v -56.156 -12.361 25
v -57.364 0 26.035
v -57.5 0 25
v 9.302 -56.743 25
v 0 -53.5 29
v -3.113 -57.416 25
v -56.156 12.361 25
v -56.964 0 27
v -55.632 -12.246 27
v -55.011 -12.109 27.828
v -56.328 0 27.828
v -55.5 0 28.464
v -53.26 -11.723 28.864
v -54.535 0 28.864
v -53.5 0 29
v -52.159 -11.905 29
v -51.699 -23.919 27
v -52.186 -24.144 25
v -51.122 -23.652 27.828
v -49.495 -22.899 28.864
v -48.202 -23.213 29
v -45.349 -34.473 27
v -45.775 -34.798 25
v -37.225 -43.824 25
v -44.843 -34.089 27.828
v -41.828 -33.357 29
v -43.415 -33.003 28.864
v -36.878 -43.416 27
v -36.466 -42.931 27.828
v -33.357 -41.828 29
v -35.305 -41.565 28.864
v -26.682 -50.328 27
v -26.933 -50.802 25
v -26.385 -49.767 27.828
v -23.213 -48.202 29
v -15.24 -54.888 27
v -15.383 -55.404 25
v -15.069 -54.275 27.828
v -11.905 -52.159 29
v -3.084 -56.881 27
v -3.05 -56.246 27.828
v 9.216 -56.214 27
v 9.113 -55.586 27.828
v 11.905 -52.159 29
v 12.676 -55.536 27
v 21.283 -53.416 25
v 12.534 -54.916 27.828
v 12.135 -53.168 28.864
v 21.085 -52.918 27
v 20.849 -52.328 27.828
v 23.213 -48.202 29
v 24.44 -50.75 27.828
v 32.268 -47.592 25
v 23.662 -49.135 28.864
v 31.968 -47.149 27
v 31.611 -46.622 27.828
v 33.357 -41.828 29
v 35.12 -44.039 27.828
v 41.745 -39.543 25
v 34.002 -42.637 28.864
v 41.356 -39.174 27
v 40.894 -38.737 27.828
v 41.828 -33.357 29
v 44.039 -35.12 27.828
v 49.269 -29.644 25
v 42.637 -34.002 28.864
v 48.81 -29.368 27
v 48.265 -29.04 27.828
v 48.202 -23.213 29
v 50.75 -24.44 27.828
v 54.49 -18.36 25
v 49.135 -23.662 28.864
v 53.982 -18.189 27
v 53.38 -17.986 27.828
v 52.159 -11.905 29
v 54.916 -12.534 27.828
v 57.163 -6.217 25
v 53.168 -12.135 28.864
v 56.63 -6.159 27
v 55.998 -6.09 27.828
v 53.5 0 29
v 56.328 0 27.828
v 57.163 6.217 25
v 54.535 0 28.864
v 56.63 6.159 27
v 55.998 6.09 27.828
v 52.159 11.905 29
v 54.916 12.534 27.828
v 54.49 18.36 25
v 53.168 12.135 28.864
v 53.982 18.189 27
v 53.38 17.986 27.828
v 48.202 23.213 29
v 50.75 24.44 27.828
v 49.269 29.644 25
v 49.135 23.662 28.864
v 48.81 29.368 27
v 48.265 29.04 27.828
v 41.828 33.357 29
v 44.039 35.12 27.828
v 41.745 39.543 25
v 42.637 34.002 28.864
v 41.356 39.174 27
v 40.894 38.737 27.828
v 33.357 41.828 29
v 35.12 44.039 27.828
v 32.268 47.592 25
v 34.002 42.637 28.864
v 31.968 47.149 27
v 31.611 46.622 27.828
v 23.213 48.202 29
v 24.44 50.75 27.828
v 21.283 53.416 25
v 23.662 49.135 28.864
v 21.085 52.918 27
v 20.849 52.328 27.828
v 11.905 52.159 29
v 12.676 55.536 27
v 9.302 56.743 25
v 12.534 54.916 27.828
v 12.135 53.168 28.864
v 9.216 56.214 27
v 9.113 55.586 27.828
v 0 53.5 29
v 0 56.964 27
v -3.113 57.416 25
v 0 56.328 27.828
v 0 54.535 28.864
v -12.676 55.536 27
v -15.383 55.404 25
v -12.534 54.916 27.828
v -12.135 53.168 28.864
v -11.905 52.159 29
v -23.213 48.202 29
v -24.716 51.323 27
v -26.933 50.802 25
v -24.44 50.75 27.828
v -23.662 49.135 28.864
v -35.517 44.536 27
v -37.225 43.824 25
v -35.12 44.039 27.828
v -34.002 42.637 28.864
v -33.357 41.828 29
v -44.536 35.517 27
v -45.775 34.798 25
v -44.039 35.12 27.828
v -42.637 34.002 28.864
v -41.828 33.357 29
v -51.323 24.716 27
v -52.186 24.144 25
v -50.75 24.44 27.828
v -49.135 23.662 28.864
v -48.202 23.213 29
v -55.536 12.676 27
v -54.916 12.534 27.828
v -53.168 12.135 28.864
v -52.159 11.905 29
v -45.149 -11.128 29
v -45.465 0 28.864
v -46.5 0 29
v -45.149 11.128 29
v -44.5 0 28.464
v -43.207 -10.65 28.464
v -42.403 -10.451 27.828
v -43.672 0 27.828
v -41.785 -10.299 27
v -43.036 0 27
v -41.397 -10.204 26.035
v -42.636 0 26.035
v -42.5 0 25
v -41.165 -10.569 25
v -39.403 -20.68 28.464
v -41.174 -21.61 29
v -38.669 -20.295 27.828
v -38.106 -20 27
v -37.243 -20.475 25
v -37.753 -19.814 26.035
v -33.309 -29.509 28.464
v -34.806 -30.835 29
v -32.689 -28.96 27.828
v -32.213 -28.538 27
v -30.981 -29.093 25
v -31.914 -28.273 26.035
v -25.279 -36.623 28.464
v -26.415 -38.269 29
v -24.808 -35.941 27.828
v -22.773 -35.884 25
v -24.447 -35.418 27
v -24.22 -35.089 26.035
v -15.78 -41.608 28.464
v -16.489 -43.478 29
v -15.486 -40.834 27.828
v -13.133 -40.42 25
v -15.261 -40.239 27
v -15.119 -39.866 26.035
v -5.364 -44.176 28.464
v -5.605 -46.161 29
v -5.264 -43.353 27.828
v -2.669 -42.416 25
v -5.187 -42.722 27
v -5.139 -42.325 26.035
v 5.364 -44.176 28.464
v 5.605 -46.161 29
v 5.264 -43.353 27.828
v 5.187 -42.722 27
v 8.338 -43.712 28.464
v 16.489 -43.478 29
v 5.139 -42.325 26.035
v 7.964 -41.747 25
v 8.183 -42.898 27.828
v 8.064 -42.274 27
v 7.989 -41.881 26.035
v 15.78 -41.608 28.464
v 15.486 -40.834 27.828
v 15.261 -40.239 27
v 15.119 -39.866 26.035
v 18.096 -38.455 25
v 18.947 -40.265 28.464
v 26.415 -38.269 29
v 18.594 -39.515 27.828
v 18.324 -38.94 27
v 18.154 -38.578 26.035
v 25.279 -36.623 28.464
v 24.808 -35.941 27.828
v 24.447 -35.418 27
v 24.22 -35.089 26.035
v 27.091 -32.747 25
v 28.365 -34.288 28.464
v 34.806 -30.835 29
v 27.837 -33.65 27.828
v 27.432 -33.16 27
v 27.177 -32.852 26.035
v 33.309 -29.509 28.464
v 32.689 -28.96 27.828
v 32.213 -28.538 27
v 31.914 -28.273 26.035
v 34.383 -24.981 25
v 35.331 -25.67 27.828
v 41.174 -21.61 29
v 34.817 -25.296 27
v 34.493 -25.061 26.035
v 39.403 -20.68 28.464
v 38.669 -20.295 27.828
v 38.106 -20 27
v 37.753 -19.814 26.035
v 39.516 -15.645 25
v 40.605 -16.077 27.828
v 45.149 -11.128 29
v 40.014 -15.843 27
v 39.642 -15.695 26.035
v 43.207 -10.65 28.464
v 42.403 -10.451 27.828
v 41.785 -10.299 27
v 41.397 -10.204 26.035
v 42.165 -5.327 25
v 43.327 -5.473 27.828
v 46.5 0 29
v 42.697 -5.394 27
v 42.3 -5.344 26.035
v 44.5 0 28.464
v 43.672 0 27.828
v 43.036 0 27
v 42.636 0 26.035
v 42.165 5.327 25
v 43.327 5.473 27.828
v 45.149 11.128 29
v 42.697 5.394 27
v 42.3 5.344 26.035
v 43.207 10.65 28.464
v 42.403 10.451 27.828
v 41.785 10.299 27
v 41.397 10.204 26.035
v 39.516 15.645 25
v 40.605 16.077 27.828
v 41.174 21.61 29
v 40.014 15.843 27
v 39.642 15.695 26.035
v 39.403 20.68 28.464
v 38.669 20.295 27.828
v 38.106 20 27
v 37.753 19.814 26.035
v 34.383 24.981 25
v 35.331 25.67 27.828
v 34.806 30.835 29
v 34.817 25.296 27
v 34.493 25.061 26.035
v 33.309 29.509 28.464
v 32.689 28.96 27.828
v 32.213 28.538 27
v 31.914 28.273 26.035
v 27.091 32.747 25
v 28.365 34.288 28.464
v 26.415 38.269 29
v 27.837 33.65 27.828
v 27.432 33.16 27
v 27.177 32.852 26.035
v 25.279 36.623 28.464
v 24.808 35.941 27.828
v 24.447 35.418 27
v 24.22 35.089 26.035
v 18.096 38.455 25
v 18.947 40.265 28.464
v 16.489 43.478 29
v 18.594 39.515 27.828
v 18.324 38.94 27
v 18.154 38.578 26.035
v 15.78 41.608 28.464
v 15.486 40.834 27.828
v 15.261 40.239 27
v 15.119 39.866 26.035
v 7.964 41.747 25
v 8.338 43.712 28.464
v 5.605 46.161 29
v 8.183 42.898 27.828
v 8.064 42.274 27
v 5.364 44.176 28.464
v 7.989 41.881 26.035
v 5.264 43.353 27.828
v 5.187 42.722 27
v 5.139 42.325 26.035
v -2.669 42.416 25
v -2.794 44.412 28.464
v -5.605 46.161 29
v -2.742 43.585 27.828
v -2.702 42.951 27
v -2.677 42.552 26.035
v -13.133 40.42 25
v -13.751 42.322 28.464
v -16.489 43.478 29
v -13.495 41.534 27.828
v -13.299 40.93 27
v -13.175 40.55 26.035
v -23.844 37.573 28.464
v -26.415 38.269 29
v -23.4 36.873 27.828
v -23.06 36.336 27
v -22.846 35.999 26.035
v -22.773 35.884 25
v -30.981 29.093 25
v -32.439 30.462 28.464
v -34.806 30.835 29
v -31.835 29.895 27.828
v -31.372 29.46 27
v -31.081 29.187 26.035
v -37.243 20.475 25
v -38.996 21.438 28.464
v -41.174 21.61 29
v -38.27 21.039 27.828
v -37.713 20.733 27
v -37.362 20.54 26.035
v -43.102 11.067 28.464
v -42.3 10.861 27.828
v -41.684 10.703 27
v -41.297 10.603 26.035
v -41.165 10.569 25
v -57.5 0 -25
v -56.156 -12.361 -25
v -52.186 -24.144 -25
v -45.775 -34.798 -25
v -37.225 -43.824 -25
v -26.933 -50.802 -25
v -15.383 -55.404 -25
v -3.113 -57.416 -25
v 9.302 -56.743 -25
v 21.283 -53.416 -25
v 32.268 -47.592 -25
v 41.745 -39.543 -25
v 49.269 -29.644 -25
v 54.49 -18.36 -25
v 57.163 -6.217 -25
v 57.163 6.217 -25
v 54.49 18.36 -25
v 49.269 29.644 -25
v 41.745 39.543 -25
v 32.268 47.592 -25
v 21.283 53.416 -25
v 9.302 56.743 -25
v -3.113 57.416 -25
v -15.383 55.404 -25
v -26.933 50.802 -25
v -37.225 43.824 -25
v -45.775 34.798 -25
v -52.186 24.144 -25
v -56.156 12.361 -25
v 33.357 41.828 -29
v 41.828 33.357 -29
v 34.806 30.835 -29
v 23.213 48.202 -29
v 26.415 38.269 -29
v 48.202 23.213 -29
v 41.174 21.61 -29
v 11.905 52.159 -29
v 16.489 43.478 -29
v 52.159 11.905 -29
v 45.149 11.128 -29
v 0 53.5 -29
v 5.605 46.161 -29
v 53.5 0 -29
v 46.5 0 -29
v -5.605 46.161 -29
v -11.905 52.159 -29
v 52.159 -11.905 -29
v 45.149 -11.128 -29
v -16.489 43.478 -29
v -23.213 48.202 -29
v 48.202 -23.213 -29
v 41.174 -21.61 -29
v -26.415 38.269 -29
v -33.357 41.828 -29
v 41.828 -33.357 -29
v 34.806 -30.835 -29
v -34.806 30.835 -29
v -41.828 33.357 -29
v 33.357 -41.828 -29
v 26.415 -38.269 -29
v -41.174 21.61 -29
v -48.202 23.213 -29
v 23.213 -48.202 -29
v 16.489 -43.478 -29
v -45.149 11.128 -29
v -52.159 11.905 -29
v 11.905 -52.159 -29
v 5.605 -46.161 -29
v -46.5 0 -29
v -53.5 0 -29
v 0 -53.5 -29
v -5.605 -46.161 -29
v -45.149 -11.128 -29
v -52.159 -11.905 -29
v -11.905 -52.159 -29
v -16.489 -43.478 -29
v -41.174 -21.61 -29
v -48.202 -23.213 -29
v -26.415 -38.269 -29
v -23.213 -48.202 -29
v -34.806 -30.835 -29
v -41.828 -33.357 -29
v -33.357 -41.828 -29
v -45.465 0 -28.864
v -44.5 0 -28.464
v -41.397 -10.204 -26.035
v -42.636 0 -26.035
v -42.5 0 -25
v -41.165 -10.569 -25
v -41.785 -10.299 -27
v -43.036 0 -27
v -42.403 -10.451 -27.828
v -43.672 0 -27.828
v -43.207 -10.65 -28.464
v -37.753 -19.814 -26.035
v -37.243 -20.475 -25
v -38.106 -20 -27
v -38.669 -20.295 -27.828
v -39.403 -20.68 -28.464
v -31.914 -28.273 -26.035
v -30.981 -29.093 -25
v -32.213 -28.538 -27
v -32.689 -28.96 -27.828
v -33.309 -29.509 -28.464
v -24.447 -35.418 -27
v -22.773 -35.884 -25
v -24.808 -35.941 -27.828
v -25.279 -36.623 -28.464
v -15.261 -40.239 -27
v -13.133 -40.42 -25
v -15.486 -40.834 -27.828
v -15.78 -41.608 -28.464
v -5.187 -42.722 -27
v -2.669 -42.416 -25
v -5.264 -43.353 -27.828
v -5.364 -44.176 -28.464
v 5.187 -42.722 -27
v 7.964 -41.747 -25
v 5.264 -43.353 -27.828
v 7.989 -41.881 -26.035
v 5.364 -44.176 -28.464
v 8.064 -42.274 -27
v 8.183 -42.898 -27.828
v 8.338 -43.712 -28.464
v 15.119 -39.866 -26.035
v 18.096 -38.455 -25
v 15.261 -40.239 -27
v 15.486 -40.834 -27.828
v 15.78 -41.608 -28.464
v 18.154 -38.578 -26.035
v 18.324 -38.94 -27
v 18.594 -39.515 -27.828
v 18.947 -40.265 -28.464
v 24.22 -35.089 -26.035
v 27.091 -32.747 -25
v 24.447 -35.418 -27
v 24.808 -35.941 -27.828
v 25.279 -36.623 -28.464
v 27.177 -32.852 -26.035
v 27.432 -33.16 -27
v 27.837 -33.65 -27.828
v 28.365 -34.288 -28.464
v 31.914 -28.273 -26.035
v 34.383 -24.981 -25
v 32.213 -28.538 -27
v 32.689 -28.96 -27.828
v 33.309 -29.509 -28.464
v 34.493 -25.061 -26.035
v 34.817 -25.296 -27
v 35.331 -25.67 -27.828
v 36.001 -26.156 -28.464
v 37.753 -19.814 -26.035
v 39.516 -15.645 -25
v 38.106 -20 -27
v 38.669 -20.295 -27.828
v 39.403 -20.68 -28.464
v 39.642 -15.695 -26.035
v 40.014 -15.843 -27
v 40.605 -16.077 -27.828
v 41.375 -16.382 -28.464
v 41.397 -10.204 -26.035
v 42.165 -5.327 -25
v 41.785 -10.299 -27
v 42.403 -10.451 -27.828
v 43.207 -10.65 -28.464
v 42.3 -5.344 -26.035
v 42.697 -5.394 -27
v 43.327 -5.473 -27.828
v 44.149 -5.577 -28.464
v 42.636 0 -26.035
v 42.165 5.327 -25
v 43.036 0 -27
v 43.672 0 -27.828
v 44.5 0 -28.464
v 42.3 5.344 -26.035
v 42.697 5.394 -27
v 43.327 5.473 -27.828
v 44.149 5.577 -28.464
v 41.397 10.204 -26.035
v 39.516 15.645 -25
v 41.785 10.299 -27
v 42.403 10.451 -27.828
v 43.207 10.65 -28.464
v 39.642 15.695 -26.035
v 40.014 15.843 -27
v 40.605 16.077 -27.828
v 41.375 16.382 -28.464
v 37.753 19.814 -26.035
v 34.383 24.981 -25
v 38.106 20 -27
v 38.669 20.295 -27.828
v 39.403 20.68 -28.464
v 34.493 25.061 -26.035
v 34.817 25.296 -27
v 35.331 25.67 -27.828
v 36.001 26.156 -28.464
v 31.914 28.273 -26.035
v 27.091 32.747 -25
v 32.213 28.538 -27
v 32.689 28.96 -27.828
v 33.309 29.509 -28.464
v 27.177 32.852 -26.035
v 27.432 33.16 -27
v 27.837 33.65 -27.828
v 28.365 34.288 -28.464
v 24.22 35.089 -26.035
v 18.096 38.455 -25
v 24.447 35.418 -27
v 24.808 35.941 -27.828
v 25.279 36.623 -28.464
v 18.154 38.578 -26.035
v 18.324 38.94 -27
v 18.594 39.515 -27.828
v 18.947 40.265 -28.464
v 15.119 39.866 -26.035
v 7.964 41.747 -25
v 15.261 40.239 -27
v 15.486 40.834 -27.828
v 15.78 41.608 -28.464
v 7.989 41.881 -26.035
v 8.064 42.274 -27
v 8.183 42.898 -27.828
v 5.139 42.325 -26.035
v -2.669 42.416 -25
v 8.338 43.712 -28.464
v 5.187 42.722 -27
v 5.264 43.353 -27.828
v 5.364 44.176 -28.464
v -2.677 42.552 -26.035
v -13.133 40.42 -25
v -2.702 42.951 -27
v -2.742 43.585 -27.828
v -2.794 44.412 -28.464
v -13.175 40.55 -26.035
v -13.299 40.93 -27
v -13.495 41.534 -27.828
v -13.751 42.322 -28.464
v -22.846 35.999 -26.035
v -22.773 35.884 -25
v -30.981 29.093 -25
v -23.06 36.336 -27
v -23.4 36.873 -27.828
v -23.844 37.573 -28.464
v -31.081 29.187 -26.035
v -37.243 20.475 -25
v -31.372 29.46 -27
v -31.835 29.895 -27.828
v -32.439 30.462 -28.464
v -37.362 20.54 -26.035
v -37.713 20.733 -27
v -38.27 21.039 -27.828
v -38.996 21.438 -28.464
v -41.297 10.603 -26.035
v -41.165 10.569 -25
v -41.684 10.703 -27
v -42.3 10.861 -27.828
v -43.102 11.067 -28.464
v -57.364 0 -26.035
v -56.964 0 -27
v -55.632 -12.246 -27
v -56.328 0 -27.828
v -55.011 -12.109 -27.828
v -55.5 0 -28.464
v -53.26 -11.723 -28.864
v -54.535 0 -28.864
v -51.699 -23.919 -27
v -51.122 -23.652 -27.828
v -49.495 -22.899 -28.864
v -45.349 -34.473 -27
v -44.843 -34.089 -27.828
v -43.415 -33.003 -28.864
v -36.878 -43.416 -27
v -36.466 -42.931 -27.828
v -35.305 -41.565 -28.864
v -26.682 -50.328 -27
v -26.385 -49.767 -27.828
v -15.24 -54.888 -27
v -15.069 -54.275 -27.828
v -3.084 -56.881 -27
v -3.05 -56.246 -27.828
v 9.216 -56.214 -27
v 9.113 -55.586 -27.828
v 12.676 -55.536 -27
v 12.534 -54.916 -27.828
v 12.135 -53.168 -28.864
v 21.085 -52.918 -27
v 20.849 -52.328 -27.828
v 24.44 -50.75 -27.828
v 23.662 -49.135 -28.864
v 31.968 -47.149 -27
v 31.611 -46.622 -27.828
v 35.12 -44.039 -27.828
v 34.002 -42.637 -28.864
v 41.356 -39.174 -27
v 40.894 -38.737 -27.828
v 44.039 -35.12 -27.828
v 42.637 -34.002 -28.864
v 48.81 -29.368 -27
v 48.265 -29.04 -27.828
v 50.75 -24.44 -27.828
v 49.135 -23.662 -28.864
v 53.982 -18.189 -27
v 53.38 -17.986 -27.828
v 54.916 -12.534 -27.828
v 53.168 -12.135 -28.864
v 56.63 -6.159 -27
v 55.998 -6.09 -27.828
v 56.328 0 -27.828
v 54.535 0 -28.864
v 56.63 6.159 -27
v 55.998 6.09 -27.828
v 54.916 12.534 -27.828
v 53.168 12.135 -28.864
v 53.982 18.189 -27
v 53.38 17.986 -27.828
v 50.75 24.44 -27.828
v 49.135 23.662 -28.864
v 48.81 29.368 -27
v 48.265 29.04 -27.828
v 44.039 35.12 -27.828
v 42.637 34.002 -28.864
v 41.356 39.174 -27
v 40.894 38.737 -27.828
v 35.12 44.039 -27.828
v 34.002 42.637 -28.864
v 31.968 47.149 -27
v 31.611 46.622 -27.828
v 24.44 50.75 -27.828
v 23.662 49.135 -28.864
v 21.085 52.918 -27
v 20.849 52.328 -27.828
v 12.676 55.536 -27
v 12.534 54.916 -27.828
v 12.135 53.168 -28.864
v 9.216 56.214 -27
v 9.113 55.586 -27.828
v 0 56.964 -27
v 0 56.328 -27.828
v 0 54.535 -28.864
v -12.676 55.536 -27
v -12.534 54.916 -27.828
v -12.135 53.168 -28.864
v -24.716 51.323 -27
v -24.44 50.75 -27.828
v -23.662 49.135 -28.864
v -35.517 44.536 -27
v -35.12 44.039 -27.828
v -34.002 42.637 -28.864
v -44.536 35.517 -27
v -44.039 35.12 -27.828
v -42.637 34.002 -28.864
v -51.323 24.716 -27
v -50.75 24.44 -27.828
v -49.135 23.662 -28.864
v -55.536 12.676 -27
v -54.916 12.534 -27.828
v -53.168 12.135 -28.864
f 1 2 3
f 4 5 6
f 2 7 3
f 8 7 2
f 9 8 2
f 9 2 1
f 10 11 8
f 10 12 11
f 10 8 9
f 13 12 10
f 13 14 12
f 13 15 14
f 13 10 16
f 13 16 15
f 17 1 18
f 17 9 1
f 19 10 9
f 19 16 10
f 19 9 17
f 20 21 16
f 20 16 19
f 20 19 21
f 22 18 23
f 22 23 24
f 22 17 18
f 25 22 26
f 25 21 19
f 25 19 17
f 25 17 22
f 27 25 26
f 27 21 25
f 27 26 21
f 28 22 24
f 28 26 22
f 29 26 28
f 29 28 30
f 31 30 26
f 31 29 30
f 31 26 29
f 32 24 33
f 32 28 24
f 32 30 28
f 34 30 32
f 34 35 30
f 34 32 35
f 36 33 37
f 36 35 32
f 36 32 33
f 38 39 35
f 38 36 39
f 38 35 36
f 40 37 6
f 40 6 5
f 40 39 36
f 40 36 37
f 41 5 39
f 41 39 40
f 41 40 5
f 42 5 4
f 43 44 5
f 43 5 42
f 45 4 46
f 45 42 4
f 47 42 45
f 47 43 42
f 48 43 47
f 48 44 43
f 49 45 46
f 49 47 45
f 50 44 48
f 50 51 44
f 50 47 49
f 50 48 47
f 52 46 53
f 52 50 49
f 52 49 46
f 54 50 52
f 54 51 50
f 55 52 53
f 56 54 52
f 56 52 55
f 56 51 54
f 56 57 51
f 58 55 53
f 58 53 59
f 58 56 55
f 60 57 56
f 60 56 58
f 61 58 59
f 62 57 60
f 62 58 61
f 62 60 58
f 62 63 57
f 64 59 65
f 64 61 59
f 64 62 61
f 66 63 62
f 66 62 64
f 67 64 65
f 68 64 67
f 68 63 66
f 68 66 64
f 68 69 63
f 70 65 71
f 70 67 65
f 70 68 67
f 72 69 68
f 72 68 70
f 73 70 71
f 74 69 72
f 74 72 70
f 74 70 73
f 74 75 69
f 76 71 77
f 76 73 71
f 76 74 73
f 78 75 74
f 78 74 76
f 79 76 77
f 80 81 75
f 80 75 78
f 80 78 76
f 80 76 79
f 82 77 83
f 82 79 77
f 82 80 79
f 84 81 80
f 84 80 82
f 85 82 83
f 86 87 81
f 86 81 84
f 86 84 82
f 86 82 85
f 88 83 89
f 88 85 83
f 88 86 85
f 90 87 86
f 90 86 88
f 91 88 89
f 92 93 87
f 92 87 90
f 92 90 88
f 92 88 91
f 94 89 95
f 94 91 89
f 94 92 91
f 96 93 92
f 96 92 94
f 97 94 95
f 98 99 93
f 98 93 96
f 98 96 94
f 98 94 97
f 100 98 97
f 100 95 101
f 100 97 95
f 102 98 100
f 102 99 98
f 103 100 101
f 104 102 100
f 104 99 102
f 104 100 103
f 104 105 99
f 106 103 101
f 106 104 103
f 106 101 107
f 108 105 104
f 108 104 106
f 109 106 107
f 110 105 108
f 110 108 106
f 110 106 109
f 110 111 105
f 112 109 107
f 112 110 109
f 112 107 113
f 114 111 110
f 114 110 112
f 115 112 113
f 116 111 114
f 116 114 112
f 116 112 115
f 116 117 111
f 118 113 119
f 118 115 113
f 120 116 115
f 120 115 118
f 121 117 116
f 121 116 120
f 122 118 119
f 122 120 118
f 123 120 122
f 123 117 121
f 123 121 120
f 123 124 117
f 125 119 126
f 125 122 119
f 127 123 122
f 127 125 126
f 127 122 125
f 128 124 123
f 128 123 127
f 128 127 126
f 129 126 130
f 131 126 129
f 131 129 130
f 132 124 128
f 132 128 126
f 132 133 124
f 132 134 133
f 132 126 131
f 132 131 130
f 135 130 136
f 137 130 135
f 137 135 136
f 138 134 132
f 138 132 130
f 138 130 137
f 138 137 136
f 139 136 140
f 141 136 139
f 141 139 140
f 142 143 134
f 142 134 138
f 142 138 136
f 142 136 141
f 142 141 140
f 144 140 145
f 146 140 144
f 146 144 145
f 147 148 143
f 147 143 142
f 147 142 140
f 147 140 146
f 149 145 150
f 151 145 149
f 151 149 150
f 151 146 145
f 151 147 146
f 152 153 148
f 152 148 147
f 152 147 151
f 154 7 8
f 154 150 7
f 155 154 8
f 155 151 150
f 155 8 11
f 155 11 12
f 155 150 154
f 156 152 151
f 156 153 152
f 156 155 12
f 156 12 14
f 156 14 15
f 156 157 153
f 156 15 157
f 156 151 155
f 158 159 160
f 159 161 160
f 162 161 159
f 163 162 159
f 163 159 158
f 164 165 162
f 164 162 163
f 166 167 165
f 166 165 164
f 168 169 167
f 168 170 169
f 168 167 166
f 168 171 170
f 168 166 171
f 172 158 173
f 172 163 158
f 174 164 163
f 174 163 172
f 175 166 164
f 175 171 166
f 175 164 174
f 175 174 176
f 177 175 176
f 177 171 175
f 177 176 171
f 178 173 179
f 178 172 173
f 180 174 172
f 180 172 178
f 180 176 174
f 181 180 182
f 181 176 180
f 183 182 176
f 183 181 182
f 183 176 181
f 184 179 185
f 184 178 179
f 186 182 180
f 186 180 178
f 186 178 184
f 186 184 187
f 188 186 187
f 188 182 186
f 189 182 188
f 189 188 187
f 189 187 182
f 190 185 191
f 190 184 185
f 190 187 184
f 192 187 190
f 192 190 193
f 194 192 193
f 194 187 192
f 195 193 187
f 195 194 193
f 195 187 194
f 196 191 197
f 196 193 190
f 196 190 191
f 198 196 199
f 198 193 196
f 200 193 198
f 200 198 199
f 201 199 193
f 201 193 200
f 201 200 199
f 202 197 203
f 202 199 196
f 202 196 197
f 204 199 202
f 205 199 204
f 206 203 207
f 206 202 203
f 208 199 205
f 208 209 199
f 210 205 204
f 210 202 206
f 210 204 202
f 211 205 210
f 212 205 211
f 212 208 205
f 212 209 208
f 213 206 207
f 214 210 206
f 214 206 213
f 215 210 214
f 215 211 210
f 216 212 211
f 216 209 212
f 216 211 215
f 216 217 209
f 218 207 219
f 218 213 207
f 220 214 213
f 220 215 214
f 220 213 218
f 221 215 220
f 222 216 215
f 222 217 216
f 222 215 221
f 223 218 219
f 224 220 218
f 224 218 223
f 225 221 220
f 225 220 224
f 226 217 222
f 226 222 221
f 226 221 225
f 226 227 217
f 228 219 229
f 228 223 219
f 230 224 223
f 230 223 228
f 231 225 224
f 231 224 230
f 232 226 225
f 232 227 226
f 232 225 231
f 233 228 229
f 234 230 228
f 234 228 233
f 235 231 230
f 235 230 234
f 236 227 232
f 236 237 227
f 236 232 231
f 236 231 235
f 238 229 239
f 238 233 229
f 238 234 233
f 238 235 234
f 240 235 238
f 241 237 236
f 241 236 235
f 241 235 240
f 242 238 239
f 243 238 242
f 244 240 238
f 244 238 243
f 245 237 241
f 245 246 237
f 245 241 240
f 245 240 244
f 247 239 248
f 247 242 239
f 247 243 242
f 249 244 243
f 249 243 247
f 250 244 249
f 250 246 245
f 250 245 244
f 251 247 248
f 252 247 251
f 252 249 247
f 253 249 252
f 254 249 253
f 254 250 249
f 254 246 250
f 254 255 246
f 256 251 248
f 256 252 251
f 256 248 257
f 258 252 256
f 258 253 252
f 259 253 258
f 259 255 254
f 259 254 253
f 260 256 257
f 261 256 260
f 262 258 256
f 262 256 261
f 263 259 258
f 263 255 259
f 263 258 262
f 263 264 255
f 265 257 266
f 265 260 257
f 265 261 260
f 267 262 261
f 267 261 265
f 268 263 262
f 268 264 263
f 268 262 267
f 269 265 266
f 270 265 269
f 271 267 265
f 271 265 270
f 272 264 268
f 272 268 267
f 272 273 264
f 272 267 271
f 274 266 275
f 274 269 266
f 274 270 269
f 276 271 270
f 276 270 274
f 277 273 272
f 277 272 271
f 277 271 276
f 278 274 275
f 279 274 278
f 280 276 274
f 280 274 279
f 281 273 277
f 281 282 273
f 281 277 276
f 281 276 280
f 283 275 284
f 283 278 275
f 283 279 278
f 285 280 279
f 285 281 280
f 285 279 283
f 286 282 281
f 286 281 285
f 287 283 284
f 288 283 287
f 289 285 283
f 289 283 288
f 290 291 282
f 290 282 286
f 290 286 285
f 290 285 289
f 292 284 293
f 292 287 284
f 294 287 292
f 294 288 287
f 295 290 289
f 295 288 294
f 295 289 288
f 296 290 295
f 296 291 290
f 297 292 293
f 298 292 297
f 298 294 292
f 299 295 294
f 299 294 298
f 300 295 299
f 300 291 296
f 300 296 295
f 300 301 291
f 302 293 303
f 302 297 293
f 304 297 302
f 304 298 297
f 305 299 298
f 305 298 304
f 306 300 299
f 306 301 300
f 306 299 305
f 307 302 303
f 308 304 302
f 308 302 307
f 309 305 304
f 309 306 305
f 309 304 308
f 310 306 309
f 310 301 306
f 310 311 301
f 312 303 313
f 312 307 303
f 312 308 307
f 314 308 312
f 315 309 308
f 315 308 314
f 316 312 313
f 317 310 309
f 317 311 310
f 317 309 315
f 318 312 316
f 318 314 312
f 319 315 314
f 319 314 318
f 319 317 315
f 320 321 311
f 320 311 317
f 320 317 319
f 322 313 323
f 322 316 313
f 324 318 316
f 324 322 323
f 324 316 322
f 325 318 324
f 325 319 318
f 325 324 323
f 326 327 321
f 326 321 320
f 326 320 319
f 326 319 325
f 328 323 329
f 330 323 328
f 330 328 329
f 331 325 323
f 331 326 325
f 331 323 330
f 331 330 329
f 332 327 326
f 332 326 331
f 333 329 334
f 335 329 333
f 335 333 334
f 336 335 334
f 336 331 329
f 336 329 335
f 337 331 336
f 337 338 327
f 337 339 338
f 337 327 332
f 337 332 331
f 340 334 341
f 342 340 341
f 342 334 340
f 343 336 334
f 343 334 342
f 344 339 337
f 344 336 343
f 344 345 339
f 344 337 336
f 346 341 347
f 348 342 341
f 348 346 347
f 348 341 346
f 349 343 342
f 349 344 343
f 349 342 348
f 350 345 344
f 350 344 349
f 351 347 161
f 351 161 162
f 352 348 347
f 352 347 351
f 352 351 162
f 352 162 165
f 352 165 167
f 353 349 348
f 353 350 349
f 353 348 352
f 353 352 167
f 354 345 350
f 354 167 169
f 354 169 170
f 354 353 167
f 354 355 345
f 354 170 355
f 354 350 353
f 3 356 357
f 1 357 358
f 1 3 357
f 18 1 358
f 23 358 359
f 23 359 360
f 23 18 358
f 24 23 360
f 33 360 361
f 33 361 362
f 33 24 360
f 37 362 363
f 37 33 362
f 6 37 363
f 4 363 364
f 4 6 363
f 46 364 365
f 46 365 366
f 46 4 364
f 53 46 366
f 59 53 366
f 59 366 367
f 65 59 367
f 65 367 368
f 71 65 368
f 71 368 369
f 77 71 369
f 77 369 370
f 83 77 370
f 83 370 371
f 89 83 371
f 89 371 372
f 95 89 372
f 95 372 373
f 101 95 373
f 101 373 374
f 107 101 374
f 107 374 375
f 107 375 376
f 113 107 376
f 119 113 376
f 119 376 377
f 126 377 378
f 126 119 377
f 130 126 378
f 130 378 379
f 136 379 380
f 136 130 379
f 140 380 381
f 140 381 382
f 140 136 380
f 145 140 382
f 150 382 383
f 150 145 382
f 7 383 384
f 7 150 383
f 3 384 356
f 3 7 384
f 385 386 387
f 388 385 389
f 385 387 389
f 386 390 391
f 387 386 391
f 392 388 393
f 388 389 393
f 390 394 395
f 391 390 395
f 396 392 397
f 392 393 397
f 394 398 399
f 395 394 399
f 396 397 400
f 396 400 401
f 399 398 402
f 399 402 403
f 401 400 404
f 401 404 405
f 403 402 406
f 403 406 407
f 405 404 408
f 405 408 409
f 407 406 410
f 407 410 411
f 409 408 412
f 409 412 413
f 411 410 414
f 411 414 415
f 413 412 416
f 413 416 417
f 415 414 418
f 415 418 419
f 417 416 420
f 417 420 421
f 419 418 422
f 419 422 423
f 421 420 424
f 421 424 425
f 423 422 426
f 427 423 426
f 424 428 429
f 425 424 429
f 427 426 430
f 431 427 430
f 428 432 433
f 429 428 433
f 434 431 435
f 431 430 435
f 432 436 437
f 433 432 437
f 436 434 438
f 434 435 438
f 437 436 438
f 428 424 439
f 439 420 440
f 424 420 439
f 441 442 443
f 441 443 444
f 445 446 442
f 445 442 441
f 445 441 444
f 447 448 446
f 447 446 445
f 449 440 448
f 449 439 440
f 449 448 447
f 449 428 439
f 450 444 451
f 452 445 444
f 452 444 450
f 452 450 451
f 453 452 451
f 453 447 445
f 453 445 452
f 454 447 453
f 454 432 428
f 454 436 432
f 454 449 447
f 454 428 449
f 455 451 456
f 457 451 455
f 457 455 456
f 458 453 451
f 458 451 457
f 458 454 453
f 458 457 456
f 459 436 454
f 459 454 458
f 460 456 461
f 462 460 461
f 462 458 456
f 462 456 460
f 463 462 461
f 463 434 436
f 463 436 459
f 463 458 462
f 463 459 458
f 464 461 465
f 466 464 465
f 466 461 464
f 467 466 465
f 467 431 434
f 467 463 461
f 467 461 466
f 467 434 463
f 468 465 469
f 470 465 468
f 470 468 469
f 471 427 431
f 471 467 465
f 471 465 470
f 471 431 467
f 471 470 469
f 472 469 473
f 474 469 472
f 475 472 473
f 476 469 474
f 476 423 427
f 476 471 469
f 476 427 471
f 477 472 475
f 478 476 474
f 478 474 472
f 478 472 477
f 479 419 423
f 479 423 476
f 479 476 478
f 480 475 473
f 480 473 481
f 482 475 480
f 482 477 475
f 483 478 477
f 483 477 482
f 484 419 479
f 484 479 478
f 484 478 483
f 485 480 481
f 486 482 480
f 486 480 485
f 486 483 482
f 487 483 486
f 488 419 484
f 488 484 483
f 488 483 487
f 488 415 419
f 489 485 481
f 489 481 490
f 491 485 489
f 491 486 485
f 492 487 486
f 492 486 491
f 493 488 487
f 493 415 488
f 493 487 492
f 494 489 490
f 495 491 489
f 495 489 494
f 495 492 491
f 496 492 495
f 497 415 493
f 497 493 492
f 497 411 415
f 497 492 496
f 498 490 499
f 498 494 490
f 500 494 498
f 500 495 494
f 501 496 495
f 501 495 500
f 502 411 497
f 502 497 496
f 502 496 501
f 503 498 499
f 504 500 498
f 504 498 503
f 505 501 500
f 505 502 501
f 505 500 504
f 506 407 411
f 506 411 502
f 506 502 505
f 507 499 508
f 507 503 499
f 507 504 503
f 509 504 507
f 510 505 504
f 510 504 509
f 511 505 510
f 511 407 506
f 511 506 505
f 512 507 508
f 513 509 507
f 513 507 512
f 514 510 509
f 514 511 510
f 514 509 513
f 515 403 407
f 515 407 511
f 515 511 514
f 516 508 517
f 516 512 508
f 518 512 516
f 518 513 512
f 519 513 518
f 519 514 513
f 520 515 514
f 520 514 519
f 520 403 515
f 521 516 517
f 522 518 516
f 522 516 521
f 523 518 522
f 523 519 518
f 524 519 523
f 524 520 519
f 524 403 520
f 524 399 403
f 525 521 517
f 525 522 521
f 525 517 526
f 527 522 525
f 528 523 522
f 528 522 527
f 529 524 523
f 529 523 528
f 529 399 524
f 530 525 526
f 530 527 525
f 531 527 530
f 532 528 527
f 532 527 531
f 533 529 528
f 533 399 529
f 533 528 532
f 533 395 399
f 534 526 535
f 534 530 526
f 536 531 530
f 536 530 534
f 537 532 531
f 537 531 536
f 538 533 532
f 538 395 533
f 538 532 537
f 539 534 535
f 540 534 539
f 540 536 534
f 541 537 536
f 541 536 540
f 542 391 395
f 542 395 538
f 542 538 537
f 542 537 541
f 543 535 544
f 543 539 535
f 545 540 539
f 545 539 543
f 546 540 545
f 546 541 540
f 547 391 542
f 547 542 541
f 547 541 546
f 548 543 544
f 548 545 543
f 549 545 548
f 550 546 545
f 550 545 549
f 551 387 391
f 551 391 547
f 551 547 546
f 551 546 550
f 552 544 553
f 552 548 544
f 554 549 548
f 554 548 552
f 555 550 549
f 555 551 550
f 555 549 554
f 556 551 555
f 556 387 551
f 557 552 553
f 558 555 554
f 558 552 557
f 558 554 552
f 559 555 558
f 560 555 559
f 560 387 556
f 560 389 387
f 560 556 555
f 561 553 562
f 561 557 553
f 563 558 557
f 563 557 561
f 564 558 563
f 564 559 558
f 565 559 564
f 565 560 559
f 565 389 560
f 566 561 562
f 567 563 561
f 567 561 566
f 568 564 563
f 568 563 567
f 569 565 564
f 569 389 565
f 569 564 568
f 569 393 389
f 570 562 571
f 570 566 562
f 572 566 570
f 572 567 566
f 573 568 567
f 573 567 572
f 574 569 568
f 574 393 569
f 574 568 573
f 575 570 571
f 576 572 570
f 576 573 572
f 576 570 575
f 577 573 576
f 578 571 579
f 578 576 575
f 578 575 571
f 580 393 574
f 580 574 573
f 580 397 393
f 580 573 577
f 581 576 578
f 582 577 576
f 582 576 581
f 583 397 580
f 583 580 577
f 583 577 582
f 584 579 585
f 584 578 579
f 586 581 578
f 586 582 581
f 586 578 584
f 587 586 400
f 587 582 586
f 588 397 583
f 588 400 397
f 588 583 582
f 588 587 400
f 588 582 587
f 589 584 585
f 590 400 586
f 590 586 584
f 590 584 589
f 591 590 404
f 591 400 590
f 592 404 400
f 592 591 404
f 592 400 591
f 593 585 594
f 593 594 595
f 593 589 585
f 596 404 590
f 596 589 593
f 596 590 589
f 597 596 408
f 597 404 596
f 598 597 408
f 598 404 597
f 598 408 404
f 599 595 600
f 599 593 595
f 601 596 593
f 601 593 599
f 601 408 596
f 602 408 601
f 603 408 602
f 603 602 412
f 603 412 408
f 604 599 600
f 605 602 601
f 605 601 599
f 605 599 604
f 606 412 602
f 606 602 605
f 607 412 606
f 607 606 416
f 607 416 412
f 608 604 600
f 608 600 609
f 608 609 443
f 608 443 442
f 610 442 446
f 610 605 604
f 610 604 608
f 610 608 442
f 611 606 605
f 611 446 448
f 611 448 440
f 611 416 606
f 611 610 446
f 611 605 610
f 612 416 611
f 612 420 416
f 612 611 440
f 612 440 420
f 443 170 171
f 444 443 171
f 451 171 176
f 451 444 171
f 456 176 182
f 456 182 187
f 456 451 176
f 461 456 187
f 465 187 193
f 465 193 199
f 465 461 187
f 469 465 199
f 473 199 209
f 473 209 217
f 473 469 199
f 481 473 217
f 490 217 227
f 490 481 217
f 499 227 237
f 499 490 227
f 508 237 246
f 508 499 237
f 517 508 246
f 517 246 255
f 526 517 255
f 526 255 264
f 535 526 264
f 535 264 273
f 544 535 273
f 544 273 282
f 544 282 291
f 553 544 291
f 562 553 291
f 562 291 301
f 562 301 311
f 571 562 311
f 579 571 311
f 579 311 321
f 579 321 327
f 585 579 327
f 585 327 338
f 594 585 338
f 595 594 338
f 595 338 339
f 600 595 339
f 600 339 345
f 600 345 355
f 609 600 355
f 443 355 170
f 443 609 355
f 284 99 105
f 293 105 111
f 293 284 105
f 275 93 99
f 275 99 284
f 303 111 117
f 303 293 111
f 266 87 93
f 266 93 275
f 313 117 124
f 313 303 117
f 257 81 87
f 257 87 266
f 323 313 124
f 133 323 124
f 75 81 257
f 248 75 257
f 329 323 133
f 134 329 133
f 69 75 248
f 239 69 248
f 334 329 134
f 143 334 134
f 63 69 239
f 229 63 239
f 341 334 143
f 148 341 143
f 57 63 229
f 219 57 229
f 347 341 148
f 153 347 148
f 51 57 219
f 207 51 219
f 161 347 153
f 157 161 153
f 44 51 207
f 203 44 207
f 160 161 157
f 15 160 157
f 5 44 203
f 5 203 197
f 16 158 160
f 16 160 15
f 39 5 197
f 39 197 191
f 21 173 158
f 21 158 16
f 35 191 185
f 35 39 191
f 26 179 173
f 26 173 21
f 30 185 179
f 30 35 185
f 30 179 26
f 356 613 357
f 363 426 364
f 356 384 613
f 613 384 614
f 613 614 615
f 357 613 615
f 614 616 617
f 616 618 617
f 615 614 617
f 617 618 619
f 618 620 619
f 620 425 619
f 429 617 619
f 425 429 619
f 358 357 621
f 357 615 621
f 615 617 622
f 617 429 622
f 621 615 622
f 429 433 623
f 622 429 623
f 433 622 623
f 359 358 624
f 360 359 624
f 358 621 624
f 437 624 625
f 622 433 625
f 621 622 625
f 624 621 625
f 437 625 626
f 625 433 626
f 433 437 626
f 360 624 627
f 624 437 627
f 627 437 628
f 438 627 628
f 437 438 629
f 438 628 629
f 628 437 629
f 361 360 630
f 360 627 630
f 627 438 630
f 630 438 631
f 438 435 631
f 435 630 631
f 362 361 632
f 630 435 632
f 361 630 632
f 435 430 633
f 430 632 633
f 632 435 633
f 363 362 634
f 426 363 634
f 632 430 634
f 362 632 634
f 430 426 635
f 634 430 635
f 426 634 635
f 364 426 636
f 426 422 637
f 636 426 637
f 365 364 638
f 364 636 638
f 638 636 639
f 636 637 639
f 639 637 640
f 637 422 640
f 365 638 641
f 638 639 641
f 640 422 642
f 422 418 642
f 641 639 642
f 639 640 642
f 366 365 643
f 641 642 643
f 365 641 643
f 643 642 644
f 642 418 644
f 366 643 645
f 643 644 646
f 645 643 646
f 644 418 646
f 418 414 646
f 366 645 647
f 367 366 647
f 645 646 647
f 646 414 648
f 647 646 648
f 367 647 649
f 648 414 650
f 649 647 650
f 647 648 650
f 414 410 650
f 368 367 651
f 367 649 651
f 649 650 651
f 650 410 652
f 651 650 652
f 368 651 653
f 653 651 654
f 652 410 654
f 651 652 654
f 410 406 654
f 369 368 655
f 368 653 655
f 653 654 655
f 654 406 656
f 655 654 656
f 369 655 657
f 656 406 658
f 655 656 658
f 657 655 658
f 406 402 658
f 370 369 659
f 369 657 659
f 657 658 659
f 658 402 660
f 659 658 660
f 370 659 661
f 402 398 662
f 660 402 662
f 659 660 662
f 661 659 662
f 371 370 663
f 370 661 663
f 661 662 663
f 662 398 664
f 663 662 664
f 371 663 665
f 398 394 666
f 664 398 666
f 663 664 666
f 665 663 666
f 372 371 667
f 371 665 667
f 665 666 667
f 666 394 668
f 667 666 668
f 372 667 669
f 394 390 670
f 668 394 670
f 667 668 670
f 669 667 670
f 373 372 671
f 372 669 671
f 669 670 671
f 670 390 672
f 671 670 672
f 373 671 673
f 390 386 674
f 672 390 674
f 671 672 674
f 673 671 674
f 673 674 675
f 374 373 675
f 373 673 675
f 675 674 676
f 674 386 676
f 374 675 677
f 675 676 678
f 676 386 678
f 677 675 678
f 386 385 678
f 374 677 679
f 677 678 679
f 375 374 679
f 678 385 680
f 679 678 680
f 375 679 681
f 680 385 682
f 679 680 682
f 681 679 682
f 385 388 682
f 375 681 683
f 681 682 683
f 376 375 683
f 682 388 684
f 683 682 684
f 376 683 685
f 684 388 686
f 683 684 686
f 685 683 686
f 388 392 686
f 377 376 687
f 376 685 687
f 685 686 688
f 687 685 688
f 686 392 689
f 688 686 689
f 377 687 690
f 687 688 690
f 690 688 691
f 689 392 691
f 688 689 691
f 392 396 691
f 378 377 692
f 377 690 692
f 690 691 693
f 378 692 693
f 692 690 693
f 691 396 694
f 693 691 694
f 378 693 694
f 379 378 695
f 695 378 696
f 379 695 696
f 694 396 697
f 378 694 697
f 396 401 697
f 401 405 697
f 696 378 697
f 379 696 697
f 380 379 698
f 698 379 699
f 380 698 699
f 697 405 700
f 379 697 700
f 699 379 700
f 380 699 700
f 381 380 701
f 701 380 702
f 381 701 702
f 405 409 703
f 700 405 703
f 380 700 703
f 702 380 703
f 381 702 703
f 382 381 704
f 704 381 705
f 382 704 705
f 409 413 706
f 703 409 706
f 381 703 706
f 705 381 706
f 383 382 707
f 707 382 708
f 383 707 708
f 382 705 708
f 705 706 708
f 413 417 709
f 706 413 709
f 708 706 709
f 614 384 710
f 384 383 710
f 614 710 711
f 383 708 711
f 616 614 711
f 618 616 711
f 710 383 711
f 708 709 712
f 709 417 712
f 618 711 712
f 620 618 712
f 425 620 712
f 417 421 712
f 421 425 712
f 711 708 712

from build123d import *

# Parameters (mm, degrees)
SKETCH_1_R        = 57.5
SKETCH_1_R_2      = 42.5
EXTRUDE_317_DEPTH = 29
FILLET_1_R        = 4


with BuildPart() as part:
    # Эскиз1 → Extrude 317 (new, symmetric)
    with BuildSketch(Plane.XY):
        with Locations(Location((0, 0, 0), (0, 0, 180))):
            Circle(SKETCH_1_R)
        with Locations(Location((0, 0, 0), (0, 0, 180))):
            Circle(SKETCH_1_R_2, mode=Mode.SUBTRACT)
    extrude(amount=EXTRUDE_317_DEPTH, both=True)

    # Скругление1
    fillet_1_edges = [part.edges().sort_by_distance(p)[0] for p in [
        (57.5, 0, -29),
        (57.5, 0, 29),
        (42.5, 0, -29),
        (42.5, 0, 29),
    ]]
    fillet(fillet_1_edges, radius=FILLET_1_R)


solid = part.part
